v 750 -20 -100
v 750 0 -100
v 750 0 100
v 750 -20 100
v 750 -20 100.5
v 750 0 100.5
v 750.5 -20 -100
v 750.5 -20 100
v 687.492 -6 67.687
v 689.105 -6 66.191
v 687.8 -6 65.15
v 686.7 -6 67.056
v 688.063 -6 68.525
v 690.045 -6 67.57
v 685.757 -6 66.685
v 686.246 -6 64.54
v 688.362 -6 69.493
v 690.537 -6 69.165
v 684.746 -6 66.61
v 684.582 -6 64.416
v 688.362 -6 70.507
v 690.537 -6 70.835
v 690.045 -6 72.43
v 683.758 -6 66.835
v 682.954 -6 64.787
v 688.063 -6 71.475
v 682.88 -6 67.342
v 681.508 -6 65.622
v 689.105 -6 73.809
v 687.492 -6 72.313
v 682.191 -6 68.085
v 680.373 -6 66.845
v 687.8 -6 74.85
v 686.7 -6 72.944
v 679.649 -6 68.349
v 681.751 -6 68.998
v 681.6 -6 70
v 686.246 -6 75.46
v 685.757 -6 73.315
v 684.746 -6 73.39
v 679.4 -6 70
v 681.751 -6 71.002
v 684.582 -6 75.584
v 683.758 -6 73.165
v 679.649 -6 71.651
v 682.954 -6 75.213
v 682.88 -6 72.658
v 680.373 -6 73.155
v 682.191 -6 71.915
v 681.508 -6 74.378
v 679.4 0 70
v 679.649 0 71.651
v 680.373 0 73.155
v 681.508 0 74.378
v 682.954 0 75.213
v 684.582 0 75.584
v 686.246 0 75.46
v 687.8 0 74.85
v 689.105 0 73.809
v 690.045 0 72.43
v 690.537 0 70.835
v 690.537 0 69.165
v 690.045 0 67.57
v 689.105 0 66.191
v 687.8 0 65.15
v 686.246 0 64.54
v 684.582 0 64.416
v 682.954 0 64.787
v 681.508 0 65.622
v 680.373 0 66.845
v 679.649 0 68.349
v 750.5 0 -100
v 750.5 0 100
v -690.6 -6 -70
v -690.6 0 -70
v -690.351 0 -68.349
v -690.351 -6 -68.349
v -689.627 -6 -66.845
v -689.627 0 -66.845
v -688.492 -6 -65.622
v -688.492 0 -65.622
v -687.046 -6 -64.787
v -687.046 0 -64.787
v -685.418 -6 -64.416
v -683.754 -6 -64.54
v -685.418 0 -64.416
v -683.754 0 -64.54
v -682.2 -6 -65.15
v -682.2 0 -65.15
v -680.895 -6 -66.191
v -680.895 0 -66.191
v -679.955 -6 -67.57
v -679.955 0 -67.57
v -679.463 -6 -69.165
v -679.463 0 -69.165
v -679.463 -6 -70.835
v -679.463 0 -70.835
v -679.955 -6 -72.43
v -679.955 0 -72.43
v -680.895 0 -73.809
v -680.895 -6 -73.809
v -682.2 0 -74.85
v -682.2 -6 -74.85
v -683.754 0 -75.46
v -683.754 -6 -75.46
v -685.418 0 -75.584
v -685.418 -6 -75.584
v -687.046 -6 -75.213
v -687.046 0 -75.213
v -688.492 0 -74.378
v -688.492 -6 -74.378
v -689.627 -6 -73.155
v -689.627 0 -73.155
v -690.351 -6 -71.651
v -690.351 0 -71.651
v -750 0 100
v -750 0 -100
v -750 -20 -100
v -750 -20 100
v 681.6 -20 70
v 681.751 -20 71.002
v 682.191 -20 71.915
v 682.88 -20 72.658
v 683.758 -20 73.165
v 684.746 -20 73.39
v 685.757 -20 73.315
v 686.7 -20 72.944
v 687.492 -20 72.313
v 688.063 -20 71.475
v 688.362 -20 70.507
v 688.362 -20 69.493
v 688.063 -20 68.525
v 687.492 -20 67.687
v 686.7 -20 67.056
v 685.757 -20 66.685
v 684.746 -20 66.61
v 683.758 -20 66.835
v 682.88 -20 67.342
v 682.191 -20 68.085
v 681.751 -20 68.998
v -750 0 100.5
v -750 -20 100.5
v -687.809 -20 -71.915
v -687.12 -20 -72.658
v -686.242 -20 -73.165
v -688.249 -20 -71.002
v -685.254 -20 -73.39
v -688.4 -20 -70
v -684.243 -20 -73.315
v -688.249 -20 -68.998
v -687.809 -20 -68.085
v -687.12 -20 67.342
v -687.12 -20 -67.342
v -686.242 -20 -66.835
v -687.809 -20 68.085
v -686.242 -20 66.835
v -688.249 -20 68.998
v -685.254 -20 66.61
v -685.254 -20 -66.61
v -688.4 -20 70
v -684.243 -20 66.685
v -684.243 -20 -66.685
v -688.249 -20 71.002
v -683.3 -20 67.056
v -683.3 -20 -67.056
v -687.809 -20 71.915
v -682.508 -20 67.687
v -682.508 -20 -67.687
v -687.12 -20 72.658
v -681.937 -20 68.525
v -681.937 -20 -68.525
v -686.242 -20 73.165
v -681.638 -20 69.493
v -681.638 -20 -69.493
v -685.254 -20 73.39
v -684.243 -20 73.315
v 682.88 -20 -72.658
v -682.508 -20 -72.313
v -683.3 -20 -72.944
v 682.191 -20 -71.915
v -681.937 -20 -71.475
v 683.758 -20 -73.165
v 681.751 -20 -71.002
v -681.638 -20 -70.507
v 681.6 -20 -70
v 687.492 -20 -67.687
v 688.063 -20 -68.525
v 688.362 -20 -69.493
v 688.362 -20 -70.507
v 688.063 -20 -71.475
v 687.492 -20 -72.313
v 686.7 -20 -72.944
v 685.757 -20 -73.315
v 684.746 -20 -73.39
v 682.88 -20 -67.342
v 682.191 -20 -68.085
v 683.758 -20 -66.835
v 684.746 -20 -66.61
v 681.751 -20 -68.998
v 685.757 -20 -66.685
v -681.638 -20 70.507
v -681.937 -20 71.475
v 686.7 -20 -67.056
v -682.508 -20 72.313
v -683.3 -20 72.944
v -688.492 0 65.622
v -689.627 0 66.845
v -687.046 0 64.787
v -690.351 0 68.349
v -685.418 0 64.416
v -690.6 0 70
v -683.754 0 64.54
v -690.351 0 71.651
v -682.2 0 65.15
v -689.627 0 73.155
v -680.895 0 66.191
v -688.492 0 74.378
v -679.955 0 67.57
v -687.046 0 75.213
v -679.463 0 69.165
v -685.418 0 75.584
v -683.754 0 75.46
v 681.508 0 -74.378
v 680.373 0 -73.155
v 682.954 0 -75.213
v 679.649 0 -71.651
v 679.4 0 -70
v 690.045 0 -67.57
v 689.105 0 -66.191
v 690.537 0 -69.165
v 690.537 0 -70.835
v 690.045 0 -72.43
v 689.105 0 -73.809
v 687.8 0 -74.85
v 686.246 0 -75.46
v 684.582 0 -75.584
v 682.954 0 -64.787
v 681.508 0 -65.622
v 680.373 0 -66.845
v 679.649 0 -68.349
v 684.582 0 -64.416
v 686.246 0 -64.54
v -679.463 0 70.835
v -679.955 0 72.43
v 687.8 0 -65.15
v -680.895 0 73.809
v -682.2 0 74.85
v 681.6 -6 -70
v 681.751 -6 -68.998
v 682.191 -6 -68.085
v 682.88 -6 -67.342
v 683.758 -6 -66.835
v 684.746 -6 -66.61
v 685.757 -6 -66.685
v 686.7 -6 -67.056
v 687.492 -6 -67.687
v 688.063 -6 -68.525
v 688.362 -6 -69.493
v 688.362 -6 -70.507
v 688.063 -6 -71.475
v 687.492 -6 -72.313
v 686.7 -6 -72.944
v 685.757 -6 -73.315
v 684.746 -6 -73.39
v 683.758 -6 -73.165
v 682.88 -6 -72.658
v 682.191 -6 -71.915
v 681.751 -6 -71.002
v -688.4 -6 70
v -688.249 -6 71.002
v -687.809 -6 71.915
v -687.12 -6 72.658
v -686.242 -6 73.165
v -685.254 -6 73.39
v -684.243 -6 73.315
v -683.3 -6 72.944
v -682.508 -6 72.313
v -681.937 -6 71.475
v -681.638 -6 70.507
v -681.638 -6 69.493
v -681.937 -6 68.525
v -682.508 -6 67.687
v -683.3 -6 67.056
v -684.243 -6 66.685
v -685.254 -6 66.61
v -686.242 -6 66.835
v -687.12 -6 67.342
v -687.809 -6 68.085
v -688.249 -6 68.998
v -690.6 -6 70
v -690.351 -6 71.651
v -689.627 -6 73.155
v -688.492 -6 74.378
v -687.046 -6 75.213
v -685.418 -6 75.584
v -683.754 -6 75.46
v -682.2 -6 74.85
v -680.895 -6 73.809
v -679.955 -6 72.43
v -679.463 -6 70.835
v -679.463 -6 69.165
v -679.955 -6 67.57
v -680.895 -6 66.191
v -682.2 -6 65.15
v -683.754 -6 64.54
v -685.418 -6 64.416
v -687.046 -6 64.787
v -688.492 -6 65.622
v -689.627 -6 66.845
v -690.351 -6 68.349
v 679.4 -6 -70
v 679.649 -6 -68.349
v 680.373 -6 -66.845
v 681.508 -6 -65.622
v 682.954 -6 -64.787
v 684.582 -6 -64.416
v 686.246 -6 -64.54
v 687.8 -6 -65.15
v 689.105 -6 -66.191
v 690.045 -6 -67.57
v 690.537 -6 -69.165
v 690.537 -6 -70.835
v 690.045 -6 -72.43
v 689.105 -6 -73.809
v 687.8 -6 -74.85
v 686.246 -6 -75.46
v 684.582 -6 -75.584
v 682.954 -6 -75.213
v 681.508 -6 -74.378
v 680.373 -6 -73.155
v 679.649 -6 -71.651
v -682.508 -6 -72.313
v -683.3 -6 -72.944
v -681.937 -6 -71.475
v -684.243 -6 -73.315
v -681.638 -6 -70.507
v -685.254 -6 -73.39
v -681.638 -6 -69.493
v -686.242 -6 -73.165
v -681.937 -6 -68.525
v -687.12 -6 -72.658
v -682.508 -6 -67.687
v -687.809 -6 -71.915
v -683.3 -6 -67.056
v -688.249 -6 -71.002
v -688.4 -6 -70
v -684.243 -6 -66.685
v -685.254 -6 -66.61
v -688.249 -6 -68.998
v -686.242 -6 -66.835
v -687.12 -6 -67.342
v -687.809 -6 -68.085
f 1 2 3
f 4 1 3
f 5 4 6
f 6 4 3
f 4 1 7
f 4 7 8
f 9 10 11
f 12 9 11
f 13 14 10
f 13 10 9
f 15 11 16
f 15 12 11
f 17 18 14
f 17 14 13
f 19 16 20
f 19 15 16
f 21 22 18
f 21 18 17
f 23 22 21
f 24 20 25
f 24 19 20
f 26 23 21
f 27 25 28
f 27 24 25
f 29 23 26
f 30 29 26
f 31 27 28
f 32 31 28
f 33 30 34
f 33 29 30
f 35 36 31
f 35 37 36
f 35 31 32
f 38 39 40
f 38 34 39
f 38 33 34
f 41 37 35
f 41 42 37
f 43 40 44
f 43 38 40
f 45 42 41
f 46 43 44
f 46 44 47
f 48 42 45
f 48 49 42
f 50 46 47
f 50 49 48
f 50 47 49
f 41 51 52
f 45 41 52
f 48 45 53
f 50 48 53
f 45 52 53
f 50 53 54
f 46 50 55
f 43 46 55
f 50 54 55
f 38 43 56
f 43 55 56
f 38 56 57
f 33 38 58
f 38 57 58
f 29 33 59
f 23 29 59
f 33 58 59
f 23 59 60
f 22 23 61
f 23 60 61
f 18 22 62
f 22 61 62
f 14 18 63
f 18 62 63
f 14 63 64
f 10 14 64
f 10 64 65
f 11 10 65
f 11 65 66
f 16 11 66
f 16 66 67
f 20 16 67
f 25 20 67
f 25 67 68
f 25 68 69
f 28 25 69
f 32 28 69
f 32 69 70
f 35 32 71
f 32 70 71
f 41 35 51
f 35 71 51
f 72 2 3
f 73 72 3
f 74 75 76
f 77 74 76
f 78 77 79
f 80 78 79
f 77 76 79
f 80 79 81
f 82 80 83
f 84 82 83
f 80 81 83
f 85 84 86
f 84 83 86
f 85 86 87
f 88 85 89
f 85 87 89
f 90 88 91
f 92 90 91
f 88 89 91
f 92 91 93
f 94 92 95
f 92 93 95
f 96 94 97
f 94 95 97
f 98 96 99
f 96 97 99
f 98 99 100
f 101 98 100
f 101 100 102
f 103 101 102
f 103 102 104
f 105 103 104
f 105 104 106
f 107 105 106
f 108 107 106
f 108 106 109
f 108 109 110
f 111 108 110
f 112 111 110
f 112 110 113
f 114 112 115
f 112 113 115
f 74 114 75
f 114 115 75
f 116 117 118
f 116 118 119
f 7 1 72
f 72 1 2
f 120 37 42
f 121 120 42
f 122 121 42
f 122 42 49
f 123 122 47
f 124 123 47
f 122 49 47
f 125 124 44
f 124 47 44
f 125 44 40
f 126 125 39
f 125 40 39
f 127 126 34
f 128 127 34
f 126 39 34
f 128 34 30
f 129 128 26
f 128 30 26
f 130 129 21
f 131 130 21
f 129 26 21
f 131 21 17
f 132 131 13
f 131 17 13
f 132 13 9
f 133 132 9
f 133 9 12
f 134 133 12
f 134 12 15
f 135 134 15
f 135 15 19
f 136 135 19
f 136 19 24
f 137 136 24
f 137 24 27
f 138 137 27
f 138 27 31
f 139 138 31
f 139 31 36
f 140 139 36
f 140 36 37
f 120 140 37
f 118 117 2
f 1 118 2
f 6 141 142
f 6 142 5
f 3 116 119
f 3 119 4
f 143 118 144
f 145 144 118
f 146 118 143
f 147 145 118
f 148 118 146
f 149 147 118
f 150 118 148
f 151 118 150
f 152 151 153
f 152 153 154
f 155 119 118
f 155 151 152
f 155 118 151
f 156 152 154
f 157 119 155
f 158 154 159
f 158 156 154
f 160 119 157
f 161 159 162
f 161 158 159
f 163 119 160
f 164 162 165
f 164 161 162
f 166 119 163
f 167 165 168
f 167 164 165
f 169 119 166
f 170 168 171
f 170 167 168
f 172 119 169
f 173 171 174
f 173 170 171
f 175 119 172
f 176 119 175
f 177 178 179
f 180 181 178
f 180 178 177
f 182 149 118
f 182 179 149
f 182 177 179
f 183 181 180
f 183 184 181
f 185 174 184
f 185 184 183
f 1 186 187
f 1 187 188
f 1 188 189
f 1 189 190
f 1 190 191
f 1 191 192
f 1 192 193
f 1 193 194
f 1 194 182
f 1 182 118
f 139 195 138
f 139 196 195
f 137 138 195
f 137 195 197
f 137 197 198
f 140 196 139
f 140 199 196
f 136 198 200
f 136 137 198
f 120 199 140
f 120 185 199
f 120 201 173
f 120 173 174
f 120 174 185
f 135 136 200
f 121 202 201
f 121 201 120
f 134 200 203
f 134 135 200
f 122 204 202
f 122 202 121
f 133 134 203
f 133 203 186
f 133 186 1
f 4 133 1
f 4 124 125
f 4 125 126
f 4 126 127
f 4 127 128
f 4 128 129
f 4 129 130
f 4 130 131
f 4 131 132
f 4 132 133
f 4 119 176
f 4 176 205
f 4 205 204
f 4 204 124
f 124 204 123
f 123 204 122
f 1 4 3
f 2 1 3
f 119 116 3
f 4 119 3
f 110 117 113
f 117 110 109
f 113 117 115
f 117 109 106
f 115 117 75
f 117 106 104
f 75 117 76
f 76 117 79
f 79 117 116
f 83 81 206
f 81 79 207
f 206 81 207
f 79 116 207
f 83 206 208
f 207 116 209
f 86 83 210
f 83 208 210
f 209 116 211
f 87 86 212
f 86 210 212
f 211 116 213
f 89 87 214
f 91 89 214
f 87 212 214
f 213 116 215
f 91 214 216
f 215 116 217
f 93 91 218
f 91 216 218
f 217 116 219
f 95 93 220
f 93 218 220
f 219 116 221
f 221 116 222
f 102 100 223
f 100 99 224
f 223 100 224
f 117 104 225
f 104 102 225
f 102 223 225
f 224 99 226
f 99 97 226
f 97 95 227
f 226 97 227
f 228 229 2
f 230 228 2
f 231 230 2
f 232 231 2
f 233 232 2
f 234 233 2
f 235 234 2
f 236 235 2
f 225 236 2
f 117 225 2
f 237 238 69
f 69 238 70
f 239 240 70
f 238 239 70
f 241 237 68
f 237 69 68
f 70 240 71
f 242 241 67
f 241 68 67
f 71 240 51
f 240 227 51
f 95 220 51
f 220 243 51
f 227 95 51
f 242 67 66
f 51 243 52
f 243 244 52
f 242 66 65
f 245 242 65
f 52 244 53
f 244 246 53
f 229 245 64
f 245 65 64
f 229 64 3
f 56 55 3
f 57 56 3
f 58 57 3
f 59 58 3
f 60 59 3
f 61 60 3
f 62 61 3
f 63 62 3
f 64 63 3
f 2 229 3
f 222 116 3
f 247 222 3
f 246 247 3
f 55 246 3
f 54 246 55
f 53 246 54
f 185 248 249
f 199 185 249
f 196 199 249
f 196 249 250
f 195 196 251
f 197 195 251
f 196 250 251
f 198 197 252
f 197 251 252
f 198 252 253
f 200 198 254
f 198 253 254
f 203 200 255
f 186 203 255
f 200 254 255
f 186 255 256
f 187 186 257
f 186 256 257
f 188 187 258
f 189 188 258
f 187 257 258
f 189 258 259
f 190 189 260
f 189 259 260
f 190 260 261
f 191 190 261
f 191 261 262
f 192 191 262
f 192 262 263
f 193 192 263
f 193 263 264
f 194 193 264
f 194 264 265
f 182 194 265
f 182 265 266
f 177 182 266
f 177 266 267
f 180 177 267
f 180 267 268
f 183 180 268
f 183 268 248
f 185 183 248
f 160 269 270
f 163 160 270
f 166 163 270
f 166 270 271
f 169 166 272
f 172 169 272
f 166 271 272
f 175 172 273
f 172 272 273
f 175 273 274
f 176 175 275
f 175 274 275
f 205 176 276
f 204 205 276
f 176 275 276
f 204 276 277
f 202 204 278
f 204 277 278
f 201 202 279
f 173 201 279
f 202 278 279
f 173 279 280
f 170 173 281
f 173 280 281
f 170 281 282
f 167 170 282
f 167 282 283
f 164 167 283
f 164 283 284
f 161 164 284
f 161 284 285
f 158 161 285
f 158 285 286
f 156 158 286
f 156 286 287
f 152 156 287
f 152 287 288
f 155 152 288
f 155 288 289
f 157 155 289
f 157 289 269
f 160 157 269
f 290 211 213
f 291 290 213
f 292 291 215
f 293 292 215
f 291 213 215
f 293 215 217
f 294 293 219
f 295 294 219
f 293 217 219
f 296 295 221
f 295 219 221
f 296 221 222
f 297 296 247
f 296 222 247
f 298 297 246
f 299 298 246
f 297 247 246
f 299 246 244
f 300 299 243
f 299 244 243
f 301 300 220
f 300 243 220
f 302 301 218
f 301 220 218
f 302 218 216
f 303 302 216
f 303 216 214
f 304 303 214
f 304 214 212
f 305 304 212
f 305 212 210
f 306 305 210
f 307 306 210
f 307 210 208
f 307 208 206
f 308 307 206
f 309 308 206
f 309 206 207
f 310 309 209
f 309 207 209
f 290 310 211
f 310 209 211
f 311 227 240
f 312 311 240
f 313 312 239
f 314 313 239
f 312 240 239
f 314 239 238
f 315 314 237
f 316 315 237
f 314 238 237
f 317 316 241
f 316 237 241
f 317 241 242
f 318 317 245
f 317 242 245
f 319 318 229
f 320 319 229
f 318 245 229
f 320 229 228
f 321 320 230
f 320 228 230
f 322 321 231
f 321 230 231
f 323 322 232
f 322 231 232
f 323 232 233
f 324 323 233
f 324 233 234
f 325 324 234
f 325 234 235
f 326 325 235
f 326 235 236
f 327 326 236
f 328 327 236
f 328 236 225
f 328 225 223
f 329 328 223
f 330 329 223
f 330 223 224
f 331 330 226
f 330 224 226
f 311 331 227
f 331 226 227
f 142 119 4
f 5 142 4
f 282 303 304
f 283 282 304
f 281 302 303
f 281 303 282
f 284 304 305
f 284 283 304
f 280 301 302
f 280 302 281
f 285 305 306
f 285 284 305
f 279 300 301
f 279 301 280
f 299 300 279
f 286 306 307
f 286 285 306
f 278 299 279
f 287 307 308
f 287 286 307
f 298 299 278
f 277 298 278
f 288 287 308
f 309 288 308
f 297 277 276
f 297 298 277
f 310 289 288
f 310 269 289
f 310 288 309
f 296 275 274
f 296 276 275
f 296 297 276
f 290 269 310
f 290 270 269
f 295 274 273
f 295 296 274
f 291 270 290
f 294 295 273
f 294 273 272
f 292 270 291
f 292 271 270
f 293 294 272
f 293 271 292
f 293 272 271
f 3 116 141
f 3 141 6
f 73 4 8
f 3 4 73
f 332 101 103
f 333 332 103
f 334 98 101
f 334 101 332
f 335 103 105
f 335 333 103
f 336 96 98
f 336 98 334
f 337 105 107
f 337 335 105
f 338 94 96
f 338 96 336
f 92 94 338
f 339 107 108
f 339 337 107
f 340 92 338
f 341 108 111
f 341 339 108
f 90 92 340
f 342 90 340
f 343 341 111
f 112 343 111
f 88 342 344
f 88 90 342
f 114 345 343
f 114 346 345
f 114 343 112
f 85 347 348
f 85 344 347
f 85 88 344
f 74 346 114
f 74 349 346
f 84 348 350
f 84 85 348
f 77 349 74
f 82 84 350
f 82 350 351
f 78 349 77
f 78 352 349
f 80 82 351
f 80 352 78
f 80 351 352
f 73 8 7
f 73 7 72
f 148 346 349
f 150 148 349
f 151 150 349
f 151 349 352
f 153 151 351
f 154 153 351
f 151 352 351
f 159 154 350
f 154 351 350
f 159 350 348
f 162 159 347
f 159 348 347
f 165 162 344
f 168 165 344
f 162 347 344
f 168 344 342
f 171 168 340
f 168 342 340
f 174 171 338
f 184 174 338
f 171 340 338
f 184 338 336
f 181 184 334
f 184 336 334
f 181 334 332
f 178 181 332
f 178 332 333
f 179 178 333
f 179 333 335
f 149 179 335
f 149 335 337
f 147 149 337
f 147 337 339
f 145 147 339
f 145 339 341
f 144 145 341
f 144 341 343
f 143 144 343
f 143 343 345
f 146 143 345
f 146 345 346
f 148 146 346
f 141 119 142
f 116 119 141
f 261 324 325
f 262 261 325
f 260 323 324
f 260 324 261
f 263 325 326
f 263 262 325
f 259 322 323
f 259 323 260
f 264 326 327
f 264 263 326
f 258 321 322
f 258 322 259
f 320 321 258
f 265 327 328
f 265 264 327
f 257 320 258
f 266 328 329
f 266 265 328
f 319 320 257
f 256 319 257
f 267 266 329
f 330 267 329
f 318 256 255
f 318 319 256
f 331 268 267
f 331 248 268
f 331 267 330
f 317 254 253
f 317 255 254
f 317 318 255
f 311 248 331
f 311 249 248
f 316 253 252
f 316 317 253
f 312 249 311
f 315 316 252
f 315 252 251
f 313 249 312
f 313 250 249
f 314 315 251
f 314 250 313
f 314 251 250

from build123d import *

# Parameters (mm, degrees)
F0_W     = 1500
F0_H     = 200
F1_DEPTH = 20
F2_R     = 5.6
F4_DEPTH = 6
F3_R     = 3.4
F5_DEPTH = 20.001
F6_W     = 1500
F6_H     = 20
F7_DEPTH = 0.5
F8_W     = 20
F8_H     = 200
F9_DEPTH = 0.5


with BuildPart() as f1:
    # F0 (on Front) → F1 (new body)
    with BuildSketch(Plane.XZ):
        Rectangle(F0_W, F0_H)
    extrude(amount=F1_DEPTH)

    # F2 (on face) → F4 (cut)
    with BuildSketch(Plane(origin=(0, 0, 0), x_dir=(-1, 0, 0), z_dir=(0, 1, 0))):
        with Locations((-685, 70)):
            Circle(F2_R)
        with Locations((-685, -70)):
            Circle(F2_R)
        with Locations((685, 70)):
            Circle(F2_R)
        with Locations((685, -70)):
            Circle(F2_R)
    extrude(amount=-F4_DEPTH, mode=Mode.SUBTRACT)

    # F3 (on face) → F5 (cut, through all)
    with BuildSketch(Plane(origin=(0, 0, 0), x_dir=(-1, 0, 0), z_dir=(0, 1, 0))):
        with Locations((-685, 70)):
            Circle(F3_R)
        with Locations((-685, -70)):
            Circle(F3_R)
        with Locations((685, 70)):
            Circle(F3_R)
        with Locations((685, -70)):
            Circle(F3_R)
    extrude(amount=-F5_DEPTH, mode=Mode.SUBTRACT)


with BuildPart() as f7:
    # F6 (on face) → F7 (new body)
    with BuildSketch(Plane.XY.offset(100)):
        with Locations((0, -10)):
            Rectangle(F6_W, F6_H)
    extrude(amount=F7_DEPTH)


with BuildPart() as f9:
    # F8 (on face) → F9 (new body)
    with BuildSketch(Plane.YZ.offset(750)):
        with Locations((-10, 0)):
            Rectangle(F8_W, F8_H)
    extrude(amount=F9_DEPTH)


solid = Compound([f1.part, f7.part, f9.part])
